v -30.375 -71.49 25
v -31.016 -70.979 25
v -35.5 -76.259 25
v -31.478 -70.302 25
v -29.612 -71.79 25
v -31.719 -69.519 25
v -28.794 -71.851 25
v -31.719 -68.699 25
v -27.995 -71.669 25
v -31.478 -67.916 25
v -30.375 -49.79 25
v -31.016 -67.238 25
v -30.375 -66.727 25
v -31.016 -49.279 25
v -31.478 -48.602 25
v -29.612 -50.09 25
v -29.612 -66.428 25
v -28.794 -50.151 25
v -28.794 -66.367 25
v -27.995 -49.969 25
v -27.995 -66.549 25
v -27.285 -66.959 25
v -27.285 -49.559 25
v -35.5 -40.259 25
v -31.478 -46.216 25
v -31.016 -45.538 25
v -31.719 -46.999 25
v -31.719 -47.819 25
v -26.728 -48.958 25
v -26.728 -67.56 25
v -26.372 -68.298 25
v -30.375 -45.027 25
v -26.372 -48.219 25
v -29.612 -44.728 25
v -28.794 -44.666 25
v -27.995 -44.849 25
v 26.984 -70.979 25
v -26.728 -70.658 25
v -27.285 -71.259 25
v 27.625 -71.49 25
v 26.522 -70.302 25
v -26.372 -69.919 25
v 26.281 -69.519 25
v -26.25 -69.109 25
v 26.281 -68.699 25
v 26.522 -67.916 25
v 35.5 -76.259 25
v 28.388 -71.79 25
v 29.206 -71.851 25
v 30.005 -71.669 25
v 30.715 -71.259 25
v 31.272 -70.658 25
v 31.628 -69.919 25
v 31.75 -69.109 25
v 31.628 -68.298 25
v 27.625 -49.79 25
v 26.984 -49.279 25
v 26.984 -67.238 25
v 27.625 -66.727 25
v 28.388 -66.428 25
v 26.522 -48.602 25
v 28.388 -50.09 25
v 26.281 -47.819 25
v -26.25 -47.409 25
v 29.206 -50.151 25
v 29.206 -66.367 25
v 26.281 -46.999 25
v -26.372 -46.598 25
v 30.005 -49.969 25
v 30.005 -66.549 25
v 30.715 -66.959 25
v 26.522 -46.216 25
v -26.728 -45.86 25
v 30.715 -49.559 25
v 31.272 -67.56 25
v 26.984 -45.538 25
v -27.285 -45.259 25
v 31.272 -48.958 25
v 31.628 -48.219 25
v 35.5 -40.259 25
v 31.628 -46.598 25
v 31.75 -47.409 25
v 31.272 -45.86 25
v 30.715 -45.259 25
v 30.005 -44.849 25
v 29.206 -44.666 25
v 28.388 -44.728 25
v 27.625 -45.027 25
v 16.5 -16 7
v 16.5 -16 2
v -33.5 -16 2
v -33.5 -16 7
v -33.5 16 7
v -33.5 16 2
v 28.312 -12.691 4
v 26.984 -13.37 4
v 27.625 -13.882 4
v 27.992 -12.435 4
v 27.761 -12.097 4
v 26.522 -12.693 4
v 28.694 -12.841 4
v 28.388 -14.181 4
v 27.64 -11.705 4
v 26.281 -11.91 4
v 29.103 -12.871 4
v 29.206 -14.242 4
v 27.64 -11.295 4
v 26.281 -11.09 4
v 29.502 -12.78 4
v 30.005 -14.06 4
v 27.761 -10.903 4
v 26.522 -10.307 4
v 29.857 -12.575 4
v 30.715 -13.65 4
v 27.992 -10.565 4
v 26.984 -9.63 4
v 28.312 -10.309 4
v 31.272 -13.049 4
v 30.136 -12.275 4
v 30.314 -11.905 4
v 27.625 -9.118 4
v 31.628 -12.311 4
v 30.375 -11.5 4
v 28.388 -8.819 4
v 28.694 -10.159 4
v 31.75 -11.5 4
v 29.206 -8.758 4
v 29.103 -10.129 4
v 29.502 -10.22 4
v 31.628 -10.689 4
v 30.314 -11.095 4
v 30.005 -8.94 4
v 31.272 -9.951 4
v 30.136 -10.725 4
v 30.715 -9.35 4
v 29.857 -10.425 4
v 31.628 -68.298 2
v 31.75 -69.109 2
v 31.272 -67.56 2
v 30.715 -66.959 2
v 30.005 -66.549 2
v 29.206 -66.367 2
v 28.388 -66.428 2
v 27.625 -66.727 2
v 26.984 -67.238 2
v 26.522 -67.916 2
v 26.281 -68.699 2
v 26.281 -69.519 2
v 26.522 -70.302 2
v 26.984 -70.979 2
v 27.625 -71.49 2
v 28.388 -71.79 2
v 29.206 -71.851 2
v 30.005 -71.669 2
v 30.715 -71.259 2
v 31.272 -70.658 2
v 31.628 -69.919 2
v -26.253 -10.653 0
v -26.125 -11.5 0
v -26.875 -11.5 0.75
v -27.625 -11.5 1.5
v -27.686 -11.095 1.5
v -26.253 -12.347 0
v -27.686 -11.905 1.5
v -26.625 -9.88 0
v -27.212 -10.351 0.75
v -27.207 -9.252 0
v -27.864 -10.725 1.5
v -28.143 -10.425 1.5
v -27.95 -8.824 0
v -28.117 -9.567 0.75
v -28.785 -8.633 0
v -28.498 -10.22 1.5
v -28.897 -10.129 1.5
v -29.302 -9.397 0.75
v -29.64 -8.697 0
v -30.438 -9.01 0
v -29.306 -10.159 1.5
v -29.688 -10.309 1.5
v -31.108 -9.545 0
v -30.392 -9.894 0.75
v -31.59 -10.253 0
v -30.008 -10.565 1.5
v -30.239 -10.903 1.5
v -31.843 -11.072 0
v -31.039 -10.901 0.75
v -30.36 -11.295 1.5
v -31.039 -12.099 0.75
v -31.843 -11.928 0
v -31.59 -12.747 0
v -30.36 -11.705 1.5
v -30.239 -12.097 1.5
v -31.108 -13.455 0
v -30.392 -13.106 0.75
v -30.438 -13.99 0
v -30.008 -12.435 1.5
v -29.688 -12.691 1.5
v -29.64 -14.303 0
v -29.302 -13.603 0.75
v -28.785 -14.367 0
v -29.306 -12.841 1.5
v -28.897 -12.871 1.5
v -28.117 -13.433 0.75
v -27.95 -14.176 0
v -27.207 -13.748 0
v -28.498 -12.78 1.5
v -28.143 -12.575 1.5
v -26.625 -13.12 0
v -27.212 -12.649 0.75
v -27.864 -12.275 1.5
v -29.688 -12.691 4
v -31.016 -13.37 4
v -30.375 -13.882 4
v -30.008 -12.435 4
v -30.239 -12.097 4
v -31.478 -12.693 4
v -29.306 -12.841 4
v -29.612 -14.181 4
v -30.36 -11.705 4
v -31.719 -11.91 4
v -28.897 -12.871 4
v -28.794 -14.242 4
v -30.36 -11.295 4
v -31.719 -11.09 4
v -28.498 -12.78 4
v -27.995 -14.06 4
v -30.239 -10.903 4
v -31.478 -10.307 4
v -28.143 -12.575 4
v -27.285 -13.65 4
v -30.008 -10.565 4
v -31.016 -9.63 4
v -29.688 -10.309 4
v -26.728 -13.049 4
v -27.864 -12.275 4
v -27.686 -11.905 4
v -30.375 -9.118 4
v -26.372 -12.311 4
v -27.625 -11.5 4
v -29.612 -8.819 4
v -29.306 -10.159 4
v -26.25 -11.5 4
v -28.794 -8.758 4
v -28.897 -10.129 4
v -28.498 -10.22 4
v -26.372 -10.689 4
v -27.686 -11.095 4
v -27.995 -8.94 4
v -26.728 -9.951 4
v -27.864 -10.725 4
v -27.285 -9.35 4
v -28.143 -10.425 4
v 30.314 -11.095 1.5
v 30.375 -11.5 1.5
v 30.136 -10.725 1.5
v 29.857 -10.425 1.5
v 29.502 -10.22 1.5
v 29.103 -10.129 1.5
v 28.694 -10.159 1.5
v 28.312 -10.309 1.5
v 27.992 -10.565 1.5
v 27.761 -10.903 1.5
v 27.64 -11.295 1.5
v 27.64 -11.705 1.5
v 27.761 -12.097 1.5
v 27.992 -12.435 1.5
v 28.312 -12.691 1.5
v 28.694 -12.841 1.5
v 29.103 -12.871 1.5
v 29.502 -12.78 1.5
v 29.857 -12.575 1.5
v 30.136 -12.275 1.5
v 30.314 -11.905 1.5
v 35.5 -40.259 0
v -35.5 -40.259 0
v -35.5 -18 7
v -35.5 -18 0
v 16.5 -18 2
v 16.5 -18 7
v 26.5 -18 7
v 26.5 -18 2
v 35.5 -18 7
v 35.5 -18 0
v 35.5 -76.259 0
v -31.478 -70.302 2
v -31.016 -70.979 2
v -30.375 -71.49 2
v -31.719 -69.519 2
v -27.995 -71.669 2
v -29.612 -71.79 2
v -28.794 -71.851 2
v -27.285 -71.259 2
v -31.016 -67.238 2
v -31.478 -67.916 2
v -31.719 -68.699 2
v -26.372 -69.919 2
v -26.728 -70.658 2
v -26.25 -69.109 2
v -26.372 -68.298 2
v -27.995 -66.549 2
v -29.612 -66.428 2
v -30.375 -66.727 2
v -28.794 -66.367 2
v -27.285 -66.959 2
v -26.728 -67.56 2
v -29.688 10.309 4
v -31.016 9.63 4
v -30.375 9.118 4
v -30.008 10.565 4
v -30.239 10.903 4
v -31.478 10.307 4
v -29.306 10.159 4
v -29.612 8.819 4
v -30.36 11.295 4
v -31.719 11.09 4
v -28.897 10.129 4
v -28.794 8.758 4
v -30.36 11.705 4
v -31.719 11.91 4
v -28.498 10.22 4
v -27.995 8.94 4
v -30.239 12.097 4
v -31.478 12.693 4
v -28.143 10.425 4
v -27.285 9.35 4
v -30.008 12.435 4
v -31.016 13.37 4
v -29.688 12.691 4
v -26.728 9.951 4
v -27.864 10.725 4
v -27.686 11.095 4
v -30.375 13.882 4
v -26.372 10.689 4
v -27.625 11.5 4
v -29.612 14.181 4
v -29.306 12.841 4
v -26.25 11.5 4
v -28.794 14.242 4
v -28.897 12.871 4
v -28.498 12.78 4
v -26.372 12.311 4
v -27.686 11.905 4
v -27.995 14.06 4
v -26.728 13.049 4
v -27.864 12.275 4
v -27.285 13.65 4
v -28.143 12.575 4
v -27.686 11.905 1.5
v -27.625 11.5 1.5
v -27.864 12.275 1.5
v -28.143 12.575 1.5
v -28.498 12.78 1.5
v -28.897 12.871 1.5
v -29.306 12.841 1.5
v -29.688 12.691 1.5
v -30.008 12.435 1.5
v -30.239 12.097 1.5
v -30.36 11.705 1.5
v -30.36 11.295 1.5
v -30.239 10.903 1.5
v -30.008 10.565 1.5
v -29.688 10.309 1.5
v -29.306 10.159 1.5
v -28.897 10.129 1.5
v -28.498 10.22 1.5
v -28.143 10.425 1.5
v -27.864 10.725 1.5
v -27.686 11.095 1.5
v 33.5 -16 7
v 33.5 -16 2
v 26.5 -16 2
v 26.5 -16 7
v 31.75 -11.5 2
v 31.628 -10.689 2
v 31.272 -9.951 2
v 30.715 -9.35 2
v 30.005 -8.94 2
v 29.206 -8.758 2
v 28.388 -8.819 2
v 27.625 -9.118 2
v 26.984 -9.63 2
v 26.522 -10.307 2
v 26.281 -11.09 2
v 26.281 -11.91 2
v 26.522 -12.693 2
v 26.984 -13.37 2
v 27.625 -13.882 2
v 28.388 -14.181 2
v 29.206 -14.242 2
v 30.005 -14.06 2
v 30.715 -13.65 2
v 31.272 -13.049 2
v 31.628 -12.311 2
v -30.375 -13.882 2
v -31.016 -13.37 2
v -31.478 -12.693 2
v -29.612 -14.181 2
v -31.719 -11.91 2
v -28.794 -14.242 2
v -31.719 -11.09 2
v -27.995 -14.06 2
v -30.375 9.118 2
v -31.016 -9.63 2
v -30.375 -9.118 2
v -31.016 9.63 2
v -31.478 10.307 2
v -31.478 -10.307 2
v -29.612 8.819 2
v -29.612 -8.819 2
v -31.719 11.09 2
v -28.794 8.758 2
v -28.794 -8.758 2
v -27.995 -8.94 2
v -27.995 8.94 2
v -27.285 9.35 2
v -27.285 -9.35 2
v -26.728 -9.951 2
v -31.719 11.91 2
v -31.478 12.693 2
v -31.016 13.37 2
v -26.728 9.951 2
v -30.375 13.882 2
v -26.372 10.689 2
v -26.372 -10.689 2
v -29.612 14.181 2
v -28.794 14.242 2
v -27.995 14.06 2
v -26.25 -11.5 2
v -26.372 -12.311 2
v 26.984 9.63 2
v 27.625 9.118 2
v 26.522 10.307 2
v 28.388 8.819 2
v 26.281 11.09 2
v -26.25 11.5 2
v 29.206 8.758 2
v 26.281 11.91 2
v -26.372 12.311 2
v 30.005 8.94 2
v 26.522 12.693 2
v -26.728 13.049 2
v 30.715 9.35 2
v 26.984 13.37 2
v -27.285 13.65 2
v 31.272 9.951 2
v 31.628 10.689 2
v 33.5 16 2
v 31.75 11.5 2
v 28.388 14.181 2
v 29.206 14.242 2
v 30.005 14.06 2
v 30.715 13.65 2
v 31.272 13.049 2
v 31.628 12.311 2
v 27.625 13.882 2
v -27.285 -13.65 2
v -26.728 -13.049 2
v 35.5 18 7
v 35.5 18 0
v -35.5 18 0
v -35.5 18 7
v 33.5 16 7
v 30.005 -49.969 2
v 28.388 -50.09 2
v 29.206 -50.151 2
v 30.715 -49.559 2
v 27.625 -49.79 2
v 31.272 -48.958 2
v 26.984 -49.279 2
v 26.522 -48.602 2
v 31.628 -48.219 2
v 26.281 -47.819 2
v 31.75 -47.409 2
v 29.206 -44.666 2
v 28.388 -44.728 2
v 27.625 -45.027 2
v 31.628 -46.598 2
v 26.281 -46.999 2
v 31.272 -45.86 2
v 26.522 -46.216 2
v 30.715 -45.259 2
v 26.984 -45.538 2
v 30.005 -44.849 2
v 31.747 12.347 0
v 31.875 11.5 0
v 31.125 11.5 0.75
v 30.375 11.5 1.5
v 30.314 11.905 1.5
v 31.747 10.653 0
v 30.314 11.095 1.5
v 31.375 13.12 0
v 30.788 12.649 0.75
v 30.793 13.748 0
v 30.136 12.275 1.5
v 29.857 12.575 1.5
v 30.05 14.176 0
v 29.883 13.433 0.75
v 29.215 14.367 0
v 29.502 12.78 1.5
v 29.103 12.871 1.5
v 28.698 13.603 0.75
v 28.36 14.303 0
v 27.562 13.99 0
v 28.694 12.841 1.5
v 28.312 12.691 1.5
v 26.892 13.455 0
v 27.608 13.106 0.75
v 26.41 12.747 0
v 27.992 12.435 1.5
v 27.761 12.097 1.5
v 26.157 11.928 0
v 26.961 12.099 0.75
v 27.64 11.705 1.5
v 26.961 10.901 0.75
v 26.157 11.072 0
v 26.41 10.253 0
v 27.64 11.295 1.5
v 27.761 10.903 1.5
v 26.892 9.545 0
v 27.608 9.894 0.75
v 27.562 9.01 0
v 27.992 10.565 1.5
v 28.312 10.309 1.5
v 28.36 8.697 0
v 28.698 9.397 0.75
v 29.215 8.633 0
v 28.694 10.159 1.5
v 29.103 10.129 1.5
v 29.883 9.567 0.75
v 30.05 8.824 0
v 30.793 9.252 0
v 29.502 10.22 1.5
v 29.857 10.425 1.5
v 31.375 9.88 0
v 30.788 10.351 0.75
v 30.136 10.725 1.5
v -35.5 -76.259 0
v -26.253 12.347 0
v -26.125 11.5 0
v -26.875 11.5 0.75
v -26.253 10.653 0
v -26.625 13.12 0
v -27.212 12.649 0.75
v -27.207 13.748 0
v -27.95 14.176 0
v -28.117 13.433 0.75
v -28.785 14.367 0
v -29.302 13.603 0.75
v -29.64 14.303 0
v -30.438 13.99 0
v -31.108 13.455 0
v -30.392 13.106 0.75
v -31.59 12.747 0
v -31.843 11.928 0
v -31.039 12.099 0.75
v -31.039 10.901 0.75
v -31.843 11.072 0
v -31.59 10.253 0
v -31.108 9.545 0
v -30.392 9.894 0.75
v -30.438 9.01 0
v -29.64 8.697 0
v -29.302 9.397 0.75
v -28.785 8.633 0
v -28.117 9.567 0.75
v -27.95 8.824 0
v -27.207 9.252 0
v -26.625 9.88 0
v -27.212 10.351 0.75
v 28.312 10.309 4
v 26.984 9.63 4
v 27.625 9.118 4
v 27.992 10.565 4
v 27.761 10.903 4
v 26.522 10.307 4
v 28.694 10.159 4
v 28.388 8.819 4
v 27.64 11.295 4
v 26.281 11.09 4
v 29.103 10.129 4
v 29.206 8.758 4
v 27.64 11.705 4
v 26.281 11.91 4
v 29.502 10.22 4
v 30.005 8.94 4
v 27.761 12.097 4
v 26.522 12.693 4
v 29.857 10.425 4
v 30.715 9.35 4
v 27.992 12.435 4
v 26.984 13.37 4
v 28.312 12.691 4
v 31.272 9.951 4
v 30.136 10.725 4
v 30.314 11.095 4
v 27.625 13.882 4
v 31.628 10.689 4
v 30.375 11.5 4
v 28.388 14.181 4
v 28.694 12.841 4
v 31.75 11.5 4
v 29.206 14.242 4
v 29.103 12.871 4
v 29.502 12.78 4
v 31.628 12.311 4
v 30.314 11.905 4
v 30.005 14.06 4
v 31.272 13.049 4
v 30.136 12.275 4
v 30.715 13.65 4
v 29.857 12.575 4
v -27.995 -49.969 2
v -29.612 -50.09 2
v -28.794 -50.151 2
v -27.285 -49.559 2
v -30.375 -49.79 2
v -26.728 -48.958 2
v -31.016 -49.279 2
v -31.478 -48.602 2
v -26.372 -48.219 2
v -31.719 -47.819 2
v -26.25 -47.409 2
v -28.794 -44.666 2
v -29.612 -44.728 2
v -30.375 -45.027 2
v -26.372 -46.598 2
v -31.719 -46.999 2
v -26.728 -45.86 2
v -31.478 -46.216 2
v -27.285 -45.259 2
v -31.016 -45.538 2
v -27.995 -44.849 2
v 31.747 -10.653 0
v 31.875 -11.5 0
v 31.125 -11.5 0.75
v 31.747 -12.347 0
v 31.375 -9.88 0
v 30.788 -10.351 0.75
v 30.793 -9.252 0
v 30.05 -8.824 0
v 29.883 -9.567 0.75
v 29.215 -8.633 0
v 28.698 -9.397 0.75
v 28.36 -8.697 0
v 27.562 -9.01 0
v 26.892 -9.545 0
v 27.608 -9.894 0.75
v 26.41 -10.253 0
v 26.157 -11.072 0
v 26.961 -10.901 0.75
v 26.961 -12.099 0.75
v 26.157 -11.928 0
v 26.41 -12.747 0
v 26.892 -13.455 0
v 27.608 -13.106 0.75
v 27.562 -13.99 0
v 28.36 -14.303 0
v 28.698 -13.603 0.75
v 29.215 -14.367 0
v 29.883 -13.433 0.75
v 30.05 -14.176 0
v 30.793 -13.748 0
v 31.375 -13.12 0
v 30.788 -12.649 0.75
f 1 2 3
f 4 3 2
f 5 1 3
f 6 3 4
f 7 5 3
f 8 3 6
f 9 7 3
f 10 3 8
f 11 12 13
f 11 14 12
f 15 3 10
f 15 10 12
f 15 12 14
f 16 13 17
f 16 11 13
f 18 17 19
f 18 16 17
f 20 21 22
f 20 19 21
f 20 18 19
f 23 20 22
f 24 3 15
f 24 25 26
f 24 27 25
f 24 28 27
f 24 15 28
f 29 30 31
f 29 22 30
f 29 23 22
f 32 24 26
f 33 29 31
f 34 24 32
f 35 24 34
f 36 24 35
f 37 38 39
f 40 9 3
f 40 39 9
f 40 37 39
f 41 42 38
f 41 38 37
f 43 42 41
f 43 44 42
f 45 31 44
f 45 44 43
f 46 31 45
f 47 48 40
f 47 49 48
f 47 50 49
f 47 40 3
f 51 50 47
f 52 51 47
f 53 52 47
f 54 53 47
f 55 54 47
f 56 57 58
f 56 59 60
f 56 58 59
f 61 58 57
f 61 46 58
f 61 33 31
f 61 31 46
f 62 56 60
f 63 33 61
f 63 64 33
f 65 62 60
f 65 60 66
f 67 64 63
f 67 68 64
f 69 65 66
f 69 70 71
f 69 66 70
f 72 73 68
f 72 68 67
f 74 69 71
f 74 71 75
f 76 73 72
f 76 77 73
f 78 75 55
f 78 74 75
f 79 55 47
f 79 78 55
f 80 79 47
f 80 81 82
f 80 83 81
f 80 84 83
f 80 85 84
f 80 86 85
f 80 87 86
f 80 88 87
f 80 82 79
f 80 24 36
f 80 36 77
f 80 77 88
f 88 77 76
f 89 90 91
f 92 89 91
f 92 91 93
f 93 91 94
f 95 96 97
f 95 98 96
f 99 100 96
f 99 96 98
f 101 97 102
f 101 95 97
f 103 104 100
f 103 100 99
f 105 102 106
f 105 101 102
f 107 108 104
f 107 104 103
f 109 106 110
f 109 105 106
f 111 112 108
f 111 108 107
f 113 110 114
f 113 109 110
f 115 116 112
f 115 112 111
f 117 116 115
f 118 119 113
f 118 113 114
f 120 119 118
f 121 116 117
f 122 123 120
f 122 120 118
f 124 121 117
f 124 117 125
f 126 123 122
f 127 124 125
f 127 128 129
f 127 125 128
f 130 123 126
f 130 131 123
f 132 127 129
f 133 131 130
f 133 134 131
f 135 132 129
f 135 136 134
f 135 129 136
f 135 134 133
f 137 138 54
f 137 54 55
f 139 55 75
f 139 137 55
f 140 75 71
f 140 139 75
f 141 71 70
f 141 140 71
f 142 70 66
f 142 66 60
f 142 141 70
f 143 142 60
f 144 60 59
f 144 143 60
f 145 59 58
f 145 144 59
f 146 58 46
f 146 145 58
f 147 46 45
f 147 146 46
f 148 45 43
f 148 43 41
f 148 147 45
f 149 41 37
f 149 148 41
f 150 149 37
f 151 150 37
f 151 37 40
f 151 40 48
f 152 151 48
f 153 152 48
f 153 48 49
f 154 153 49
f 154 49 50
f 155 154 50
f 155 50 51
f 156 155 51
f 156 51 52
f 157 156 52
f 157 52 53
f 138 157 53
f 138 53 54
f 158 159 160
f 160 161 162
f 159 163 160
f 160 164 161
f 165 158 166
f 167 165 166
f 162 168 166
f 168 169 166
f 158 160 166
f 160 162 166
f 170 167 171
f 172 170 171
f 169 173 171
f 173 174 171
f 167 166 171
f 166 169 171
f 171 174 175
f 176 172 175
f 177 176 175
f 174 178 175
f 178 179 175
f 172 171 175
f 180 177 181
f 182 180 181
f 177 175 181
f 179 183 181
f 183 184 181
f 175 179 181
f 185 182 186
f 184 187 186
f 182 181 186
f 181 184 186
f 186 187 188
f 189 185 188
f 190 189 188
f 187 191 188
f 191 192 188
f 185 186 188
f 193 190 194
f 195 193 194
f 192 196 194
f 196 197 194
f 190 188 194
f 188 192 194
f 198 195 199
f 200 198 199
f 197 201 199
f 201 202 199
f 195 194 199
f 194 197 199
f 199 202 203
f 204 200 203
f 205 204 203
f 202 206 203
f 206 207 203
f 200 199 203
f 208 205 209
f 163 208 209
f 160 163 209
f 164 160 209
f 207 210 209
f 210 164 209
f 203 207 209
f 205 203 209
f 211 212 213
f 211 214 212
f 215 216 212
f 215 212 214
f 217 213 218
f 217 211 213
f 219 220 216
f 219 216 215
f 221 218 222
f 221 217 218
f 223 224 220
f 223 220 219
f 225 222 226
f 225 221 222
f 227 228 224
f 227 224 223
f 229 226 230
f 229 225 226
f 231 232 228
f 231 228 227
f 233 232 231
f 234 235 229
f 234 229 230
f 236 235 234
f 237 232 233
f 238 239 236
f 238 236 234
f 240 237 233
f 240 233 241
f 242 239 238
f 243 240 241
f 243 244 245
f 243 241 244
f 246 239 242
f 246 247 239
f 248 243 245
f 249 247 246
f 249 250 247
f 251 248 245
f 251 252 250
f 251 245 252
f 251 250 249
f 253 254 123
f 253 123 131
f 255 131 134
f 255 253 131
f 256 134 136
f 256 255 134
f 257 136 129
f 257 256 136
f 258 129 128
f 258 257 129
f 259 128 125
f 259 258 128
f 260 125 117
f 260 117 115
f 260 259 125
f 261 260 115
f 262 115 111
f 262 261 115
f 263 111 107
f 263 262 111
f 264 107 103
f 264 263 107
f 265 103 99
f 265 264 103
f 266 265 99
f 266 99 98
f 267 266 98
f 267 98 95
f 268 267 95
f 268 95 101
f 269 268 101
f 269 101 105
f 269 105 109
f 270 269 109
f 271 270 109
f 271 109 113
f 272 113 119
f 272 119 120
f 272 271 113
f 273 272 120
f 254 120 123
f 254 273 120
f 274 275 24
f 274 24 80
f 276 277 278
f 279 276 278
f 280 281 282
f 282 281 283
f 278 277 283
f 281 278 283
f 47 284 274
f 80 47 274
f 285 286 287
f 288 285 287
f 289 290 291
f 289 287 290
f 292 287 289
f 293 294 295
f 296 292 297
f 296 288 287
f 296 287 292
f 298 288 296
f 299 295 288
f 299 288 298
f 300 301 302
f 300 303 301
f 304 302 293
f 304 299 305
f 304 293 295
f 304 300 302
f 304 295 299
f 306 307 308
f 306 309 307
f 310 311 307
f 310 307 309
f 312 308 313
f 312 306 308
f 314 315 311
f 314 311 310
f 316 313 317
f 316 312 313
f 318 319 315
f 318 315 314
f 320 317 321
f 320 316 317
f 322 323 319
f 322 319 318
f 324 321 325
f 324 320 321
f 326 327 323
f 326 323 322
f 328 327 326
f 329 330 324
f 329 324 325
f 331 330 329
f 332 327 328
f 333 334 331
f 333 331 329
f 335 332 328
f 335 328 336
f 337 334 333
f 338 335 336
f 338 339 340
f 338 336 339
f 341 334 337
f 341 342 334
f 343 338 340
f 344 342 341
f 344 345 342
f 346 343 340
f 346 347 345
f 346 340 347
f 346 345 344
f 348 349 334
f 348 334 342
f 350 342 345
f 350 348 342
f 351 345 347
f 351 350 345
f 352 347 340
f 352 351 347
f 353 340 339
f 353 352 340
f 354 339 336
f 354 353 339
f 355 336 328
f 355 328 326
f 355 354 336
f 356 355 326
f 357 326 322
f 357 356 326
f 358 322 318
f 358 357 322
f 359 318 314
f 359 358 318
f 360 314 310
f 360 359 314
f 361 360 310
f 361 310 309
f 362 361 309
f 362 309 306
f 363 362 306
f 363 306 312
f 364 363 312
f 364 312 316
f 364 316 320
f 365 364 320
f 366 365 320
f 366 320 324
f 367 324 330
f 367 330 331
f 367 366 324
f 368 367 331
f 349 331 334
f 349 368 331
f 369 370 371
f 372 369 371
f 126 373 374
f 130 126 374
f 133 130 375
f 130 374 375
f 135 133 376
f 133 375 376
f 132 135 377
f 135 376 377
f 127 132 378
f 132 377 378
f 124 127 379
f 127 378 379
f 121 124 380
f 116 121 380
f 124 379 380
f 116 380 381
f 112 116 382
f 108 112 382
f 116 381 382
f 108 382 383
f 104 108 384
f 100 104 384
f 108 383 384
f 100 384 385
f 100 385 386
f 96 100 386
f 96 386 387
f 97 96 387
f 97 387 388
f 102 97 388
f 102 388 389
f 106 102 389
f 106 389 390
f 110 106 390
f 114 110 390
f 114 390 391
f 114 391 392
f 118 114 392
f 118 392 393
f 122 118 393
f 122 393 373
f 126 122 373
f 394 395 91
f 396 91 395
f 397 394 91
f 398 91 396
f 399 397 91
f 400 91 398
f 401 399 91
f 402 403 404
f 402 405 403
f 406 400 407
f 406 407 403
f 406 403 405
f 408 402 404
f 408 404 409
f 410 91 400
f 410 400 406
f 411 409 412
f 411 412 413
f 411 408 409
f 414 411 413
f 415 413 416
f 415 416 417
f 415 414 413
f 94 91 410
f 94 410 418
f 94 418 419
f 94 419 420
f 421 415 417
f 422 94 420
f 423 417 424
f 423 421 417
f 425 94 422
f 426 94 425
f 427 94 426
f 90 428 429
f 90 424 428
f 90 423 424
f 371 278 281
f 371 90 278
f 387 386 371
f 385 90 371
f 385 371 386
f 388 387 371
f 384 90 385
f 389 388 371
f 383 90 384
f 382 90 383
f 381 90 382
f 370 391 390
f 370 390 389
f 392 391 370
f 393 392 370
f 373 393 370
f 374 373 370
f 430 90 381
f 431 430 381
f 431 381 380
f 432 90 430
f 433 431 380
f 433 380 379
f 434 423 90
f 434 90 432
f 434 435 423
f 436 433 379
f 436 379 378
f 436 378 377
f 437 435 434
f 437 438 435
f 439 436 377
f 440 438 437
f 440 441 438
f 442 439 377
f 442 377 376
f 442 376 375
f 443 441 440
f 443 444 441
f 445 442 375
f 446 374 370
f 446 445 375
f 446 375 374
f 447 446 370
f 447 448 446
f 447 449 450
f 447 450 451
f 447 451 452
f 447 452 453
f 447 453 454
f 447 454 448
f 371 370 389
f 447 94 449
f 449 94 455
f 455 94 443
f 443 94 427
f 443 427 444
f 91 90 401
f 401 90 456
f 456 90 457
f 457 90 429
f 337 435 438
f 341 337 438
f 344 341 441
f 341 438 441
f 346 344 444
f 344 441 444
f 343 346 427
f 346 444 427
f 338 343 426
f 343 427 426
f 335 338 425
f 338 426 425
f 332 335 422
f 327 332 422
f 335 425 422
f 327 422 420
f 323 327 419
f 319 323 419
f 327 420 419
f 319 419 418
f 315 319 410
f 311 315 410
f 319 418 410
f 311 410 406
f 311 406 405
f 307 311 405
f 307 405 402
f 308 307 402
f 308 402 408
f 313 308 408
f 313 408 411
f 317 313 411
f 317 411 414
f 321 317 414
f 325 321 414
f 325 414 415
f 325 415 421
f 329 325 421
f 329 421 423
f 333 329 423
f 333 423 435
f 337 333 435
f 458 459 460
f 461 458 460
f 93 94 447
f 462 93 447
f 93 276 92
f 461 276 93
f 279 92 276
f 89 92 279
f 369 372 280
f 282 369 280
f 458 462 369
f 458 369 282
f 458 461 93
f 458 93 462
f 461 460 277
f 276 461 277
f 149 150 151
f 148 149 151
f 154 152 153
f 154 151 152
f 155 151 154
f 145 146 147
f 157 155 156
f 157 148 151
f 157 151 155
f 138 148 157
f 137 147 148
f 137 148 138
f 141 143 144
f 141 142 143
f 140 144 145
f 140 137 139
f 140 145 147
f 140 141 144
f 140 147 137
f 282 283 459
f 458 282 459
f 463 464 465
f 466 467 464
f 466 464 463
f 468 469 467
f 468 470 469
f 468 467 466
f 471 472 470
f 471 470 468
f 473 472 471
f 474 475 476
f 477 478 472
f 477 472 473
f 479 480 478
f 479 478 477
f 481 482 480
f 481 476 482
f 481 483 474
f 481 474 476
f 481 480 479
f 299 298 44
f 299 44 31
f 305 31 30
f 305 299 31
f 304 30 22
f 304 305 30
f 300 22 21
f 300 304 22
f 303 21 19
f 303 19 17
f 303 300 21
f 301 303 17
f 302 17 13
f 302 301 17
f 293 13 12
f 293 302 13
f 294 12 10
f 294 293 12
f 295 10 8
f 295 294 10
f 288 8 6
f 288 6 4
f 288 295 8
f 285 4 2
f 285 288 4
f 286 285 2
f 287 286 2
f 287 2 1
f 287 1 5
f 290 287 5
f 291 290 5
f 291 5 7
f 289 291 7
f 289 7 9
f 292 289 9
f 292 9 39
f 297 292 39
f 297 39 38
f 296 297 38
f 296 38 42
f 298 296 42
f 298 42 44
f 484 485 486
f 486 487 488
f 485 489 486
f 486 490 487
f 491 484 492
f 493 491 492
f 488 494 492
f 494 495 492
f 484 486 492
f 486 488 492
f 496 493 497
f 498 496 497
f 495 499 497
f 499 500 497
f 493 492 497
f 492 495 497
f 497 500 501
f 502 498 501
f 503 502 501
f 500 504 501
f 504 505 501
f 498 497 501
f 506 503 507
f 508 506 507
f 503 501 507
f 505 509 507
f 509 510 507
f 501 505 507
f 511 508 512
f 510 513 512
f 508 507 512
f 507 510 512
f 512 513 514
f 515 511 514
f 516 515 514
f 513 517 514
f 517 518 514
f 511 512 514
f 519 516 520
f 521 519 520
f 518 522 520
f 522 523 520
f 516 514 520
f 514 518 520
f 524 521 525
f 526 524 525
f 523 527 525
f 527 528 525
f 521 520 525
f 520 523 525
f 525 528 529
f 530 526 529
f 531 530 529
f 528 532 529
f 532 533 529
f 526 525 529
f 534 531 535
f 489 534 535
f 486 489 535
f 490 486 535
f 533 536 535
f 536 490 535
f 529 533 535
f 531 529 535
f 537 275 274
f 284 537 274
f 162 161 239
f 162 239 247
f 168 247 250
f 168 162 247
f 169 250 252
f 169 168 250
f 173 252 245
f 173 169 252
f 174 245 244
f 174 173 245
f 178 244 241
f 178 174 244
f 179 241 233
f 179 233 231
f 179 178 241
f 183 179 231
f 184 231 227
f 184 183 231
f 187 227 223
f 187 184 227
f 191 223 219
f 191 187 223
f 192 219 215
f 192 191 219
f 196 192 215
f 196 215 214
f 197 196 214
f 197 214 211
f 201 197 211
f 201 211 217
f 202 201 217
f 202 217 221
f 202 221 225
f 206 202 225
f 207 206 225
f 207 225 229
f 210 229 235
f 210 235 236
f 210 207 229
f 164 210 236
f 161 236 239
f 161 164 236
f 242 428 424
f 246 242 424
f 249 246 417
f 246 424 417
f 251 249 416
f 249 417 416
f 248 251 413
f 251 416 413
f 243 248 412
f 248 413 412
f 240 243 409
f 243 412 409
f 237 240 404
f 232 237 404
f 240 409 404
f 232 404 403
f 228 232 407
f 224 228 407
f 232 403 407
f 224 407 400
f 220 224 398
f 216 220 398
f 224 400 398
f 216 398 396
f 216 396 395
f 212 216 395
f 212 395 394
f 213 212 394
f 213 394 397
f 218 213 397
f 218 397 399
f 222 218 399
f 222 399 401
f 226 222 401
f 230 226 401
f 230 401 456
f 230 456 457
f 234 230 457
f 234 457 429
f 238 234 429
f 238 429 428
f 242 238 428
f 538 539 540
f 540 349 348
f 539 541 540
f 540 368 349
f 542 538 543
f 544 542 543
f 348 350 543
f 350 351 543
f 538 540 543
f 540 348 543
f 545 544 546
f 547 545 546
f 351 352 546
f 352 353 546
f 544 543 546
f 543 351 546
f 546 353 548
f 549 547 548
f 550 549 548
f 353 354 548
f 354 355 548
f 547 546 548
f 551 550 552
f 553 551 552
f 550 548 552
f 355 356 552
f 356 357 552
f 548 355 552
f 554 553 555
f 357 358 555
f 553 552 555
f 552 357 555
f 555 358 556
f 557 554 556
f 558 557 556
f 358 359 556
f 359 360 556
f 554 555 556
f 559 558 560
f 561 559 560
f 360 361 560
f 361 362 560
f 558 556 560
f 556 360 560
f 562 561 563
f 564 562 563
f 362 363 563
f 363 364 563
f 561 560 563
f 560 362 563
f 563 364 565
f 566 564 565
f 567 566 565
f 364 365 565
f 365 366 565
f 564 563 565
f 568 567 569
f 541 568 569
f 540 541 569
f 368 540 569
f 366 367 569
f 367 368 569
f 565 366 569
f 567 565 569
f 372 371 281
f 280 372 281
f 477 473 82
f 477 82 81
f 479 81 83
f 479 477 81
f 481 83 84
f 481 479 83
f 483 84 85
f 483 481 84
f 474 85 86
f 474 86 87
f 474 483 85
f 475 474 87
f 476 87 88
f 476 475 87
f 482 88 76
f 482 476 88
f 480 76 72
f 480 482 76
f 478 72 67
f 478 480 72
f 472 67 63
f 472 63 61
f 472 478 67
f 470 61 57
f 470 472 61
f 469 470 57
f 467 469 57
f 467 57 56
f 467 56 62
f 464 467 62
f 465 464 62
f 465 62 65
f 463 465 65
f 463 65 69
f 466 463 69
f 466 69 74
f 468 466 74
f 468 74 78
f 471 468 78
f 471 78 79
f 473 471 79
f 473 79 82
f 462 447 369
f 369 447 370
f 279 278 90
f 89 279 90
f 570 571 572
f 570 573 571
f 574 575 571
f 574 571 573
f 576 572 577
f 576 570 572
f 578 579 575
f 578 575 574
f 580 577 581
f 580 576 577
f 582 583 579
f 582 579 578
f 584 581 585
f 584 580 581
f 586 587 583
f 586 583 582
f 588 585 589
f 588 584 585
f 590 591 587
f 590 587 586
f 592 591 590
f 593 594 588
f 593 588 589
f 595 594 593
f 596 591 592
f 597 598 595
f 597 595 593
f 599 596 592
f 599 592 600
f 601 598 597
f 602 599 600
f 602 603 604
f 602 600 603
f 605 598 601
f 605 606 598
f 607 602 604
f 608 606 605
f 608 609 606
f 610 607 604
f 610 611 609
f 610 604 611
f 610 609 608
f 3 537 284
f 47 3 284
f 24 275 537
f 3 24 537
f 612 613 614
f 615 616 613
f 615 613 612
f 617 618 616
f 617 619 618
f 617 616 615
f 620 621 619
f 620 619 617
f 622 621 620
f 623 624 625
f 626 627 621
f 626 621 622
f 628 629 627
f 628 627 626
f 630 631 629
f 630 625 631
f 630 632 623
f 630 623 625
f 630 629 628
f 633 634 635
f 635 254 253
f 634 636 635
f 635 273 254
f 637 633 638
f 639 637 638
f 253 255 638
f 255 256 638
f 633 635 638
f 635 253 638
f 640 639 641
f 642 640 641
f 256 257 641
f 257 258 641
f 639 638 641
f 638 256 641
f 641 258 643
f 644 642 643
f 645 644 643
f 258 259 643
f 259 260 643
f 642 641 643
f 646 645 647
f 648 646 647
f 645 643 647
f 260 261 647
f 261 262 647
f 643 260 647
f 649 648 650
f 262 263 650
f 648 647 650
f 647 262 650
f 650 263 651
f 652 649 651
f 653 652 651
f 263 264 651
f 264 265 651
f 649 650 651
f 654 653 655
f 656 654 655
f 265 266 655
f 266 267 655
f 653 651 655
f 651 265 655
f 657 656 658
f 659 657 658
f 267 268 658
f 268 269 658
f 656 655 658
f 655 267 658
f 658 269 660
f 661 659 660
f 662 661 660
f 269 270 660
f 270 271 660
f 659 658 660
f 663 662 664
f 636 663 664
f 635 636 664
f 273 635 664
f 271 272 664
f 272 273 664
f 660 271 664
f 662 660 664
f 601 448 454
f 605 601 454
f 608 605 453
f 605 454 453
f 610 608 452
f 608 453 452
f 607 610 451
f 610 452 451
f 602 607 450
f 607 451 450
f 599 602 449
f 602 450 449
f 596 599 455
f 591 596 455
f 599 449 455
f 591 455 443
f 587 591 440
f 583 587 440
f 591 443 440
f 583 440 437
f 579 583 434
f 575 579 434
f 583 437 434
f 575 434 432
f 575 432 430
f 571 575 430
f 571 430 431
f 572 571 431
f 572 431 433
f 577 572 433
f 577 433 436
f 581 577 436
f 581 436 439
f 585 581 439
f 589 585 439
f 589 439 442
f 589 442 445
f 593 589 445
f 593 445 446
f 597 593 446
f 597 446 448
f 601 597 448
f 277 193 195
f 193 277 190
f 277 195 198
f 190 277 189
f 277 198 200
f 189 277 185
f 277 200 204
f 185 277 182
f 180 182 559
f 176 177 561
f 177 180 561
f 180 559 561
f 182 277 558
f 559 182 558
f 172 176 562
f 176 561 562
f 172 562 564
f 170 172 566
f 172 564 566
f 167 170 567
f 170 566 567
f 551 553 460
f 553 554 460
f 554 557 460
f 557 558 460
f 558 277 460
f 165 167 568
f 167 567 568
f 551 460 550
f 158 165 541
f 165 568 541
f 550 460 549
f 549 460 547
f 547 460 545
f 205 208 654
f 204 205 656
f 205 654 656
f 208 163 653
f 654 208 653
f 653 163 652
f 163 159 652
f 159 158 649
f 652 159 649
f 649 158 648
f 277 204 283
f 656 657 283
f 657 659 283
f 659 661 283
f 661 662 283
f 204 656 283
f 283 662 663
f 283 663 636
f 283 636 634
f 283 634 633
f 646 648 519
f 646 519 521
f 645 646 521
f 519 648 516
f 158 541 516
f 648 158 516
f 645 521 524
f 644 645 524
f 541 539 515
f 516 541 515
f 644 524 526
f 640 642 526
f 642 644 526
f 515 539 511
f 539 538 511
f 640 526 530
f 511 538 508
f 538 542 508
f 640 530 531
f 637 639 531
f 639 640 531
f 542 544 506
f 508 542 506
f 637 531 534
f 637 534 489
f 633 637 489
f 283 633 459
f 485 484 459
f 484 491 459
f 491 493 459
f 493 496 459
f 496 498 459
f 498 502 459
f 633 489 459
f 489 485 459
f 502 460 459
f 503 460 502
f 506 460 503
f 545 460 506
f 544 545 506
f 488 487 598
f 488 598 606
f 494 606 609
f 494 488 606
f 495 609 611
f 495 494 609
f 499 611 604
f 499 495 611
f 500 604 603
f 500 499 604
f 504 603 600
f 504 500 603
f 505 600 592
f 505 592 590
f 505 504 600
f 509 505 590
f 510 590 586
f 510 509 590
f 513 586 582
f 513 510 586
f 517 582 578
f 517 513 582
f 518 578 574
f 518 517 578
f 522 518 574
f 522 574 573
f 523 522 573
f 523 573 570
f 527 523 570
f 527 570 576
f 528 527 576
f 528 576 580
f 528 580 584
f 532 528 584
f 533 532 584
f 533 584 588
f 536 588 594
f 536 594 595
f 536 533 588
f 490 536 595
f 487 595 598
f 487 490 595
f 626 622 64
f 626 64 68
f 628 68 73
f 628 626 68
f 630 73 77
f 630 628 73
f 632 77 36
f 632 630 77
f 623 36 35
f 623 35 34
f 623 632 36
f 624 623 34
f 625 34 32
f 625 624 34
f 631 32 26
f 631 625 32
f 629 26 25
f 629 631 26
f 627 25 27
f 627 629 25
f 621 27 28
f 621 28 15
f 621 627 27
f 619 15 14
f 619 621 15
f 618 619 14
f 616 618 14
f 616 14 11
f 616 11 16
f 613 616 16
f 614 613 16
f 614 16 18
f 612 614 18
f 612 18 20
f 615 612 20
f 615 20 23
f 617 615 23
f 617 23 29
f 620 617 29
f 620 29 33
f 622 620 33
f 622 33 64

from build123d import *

# Parameters (mm, degrees)
F0_W     = 10
F0_H     = 2
F0_R     = 2.75
F0_R_2   = 1.375
F1_DEPTH = 2
F2_DEPTH = 7
F3_DEPTH = 4
F4_SIZE  = 1.5
F5_W     = 71
F5_H     = 18
F5_R     = 2.75
F5_R_2   = 1.375
F6_DEPTH = 2
F7_DEPTH = 25


with BuildPart() as f1:
    # F0 (on Top) → F1 (new body)
    with BuildSketch(Plane.XY):
        with Locations((21.5, -17)):
            Rectangle(F0_W, F0_H)
        Polygon((26.5, -15), (32.5, -15), (32.5, 15), (-32.5, 15), (-32.5, -15), (16.5, -15), (21.5, -15), align=None)
        with Locations((-29, -11.5)):
            Circle(F0_R, mode=Mode.SUBTRACT)
        with Locations((29, -11.5)):
            Circle(F0_R, mode=Mode.SUBTRACT)
        with Locations((-29, 11.5)):
            Circle(F0_R, mode=Mode.SUBTRACT)
        with Locations((29, 11.5)):
            Circle(F0_R, mode=Mode.SUBTRACT)
        Polygon((33.5, -16), (26.5, -16), (26.5, -18), (35.5, -18), (35.5, 18), (-35.5, 18), (-35.5, -18), (16.5, -18), (16.5, -16), (-33.5, -16), (-33.5, 16), (33.5, 16), align=None)
        Polygon((32.5, 15), (32.5, -15), (26.5, -15), (26.5, -16), (33.5, -16), (33.5, 16), (-33.5, 16), (-33.5, -16), (16.5, -16), (16.5, -15), (-32.5, -15), (-32.5, 15), align=None)
        with Locations((29, 11.5)):
            Circle(F0_R)
        with Locations((29, 11.5)):
            Circle(F0_R_2, mode=Mode.SUBTRACT)
        with Locations((29, -11.5)):
            Circle(F0_R)
        with Locations((29, -11.5)):
            Circle(F0_R_2, mode=Mode.SUBTRACT)
        Polygon((26.5, -16), (26.5, -15), (21.5, -15), (16.5, -15), (16.5, -16), align=None)
        with Locations((-29, 11.5)):
            Circle(F0_R)
        with Locations((-29, 11.5)):
            Circle(F0_R_2, mode=Mode.SUBTRACT)
        with Locations((-29, -11.5)):
            Circle(F0_R)
        with Locations((-29, -11.5)):
            Circle(F0_R_2, mode=Mode.SUBTRACT)
    extrude(amount=F1_DEPTH)

    # F0 (on Top) → F2 (join)
    with BuildSketch(Plane.XY):
        Polygon((33.5, -16), (26.5, -16), (26.5, -18), (35.5, -18), (35.5, 18), (-35.5, 18), (-35.5, -18), (16.5, -18), (16.5, -16), (-33.5, -16), (-33.5, 16), (33.5, 16), align=None)
    extrude(amount=F2_DEPTH)

    # F0 (on Top) → F3 (join)
    with BuildSketch(Plane.XY):
        with Locations((-29, -11.5)):
            Circle(F0_R)
        with Locations((-29, -11.5)):
            Circle(F0_R_2, mode=Mode.SUBTRACT)
        with Locations((-29, 11.5)):
            Circle(F0_R)
        with Locations((-29, 11.5)):
            Circle(F0_R_2, mode=Mode.SUBTRACT)
        with Locations((29, -11.5)):
            Circle(F0_R)
        with Locations((29, -11.5)):
            Circle(F0_R_2, mode=Mode.SUBTRACT)
        with Locations((29, 11.5)):
            Circle(F0_R)
        with Locations((29, 11.5)):
            Circle(F0_R_2, mode=Mode.SUBTRACT)
    extrude(amount=F3_DEPTH)

    # F4
    f4_edges = [f1.edges().sort_by_distance(p)[0] for p in [
        (-30.375, -11.5, 0),
        (-30.375, 11.5, 0),
        (27.625, -11.5, 0),
        (27.625, 11.5, 0),
    ]]
    chamfer(f4_edges, length=F4_SIZE)


with BuildPart() as f6:
    # F5 (on Top) → F6 (new body)
    with BuildSketch(Plane.XY):
        with Locations((0, -49.2588068703)):
            Rectangle(F5_W, F5_H)
        with Locations((-29, -47.4087968469)):
            Circle(F5_R, mode=Mode.SUBTRACT)
        with Locations((29, -47.4087968469)):
            Circle(F5_R, mode=Mode.SUBTRACT)
        with Locations((0, -67.2588068703)):
            Rectangle(F5_W, F5_H)
        with Locations((-29, -69.1088168938)):
            Circle(F5_R, mode=Mode.SUBTRACT)
        with Locations((29, -69.1088168938)):
            Circle(F5_R, mode=Mode.SUBTRACT)
        with Locations((-29, -47.4087968469)):
            Circle(F5_R)
        with Locations((-29, -47.4087968469)):
            Circle(F5_R_2, mode=Mode.SUBTRACT)
        with Locations((29, -47.4087968469)):
            Circle(F5_R)
        with Locations((29, -47.4087968469)):
            Circle(F5_R_2, mode=Mode.SUBTRACT)
        with Locations((-29, -69.1088168938)):
            Circle(F5_R)
        with Locations((-29, -69.1088168938)):
            Circle(F5_R_2, mode=Mode.SUBTRACT)
        with Locations((29, -69.1088168938)):
            Circle(F5_R)
        with Locations((29, -69.1088168938)):
            Circle(F5_R_2, mode=Mode.SUBTRACT)
        with Locations((-29, -47.4087968469)):
            Circle(F5_R_2)
        with Locations((29, -47.4087968469)):
            Circle(F5_R_2)
        with Locations((-29, -69.1088168938)):
            Circle(F5_R_2)
        with Locations((29, -69.1088168938)):
            Circle(F5_R_2)
    extrude(amount=F6_DEPTH)

    # F5 (on Top) → F7 (join)
    with BuildSketch(Plane.XY):
        with Locations((0, -67.2588068703)):
            Rectangle(F5_W, F5_H)
        with Locations((-29, -69.1088168938)):
            Circle(F5_R, mode=Mode.SUBTRACT)
        with Locations((29, -69.1088168938)):
            Circle(F5_R, mode=Mode.SUBTRACT)
        with Locations((0, -49.2588068703)):
            Rectangle(F5_W, F5_H)
        with Locations((-29, -47.4087968469)):
            Circle(F5_R, mode=Mode.SUBTRACT)
        with Locations((29, -47.4087968469)):
            Circle(F5_R, mode=Mode.SUBTRACT)
    extrude(amount=F7_DEPTH)


solid = Compound([f1.part, f6.part])
